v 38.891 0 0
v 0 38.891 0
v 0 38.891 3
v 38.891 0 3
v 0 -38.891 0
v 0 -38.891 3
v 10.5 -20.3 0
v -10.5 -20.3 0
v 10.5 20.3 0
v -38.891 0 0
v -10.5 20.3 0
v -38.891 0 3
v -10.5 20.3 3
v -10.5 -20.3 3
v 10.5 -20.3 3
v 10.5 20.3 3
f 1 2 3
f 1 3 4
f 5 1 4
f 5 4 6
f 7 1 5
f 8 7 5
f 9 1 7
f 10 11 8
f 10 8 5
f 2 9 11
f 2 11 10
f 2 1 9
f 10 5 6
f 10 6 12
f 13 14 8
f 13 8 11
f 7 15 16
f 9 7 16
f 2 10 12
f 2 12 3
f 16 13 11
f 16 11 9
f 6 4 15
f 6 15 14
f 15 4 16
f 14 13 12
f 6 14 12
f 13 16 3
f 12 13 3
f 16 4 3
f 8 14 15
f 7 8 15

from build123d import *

# Parameters (mm, degrees)
BOSS_EXTRUDE1_DEPTH = 3
SKETCH2_W           = 21
SKETCH2_H           = 40.6
CUT_EXTRUDE1_DEPTH  = 3


with BuildPart() as part:
    # Sketch1 → Boss-Extrude1 (new body)
    with BuildSketch(Plane.XY):
        Polygon((-38.890872965, 0), (0, 38.890872965), (38.890872965, 0), (0, -38.890872965), align=None)
    extrude(amount=BOSS_EXTRUDE1_DEPTH)

    # Sketch2 → Cut-Extrude1 (cut)
    with BuildSketch(Plane.XY.offset(3)):
        Rectangle(SKETCH2_W, SKETCH2_H)
    extrude(amount=-CUT_EXTRUDE1_DEPTH, mode=Mode.SUBTRACT)


solid = part.part
